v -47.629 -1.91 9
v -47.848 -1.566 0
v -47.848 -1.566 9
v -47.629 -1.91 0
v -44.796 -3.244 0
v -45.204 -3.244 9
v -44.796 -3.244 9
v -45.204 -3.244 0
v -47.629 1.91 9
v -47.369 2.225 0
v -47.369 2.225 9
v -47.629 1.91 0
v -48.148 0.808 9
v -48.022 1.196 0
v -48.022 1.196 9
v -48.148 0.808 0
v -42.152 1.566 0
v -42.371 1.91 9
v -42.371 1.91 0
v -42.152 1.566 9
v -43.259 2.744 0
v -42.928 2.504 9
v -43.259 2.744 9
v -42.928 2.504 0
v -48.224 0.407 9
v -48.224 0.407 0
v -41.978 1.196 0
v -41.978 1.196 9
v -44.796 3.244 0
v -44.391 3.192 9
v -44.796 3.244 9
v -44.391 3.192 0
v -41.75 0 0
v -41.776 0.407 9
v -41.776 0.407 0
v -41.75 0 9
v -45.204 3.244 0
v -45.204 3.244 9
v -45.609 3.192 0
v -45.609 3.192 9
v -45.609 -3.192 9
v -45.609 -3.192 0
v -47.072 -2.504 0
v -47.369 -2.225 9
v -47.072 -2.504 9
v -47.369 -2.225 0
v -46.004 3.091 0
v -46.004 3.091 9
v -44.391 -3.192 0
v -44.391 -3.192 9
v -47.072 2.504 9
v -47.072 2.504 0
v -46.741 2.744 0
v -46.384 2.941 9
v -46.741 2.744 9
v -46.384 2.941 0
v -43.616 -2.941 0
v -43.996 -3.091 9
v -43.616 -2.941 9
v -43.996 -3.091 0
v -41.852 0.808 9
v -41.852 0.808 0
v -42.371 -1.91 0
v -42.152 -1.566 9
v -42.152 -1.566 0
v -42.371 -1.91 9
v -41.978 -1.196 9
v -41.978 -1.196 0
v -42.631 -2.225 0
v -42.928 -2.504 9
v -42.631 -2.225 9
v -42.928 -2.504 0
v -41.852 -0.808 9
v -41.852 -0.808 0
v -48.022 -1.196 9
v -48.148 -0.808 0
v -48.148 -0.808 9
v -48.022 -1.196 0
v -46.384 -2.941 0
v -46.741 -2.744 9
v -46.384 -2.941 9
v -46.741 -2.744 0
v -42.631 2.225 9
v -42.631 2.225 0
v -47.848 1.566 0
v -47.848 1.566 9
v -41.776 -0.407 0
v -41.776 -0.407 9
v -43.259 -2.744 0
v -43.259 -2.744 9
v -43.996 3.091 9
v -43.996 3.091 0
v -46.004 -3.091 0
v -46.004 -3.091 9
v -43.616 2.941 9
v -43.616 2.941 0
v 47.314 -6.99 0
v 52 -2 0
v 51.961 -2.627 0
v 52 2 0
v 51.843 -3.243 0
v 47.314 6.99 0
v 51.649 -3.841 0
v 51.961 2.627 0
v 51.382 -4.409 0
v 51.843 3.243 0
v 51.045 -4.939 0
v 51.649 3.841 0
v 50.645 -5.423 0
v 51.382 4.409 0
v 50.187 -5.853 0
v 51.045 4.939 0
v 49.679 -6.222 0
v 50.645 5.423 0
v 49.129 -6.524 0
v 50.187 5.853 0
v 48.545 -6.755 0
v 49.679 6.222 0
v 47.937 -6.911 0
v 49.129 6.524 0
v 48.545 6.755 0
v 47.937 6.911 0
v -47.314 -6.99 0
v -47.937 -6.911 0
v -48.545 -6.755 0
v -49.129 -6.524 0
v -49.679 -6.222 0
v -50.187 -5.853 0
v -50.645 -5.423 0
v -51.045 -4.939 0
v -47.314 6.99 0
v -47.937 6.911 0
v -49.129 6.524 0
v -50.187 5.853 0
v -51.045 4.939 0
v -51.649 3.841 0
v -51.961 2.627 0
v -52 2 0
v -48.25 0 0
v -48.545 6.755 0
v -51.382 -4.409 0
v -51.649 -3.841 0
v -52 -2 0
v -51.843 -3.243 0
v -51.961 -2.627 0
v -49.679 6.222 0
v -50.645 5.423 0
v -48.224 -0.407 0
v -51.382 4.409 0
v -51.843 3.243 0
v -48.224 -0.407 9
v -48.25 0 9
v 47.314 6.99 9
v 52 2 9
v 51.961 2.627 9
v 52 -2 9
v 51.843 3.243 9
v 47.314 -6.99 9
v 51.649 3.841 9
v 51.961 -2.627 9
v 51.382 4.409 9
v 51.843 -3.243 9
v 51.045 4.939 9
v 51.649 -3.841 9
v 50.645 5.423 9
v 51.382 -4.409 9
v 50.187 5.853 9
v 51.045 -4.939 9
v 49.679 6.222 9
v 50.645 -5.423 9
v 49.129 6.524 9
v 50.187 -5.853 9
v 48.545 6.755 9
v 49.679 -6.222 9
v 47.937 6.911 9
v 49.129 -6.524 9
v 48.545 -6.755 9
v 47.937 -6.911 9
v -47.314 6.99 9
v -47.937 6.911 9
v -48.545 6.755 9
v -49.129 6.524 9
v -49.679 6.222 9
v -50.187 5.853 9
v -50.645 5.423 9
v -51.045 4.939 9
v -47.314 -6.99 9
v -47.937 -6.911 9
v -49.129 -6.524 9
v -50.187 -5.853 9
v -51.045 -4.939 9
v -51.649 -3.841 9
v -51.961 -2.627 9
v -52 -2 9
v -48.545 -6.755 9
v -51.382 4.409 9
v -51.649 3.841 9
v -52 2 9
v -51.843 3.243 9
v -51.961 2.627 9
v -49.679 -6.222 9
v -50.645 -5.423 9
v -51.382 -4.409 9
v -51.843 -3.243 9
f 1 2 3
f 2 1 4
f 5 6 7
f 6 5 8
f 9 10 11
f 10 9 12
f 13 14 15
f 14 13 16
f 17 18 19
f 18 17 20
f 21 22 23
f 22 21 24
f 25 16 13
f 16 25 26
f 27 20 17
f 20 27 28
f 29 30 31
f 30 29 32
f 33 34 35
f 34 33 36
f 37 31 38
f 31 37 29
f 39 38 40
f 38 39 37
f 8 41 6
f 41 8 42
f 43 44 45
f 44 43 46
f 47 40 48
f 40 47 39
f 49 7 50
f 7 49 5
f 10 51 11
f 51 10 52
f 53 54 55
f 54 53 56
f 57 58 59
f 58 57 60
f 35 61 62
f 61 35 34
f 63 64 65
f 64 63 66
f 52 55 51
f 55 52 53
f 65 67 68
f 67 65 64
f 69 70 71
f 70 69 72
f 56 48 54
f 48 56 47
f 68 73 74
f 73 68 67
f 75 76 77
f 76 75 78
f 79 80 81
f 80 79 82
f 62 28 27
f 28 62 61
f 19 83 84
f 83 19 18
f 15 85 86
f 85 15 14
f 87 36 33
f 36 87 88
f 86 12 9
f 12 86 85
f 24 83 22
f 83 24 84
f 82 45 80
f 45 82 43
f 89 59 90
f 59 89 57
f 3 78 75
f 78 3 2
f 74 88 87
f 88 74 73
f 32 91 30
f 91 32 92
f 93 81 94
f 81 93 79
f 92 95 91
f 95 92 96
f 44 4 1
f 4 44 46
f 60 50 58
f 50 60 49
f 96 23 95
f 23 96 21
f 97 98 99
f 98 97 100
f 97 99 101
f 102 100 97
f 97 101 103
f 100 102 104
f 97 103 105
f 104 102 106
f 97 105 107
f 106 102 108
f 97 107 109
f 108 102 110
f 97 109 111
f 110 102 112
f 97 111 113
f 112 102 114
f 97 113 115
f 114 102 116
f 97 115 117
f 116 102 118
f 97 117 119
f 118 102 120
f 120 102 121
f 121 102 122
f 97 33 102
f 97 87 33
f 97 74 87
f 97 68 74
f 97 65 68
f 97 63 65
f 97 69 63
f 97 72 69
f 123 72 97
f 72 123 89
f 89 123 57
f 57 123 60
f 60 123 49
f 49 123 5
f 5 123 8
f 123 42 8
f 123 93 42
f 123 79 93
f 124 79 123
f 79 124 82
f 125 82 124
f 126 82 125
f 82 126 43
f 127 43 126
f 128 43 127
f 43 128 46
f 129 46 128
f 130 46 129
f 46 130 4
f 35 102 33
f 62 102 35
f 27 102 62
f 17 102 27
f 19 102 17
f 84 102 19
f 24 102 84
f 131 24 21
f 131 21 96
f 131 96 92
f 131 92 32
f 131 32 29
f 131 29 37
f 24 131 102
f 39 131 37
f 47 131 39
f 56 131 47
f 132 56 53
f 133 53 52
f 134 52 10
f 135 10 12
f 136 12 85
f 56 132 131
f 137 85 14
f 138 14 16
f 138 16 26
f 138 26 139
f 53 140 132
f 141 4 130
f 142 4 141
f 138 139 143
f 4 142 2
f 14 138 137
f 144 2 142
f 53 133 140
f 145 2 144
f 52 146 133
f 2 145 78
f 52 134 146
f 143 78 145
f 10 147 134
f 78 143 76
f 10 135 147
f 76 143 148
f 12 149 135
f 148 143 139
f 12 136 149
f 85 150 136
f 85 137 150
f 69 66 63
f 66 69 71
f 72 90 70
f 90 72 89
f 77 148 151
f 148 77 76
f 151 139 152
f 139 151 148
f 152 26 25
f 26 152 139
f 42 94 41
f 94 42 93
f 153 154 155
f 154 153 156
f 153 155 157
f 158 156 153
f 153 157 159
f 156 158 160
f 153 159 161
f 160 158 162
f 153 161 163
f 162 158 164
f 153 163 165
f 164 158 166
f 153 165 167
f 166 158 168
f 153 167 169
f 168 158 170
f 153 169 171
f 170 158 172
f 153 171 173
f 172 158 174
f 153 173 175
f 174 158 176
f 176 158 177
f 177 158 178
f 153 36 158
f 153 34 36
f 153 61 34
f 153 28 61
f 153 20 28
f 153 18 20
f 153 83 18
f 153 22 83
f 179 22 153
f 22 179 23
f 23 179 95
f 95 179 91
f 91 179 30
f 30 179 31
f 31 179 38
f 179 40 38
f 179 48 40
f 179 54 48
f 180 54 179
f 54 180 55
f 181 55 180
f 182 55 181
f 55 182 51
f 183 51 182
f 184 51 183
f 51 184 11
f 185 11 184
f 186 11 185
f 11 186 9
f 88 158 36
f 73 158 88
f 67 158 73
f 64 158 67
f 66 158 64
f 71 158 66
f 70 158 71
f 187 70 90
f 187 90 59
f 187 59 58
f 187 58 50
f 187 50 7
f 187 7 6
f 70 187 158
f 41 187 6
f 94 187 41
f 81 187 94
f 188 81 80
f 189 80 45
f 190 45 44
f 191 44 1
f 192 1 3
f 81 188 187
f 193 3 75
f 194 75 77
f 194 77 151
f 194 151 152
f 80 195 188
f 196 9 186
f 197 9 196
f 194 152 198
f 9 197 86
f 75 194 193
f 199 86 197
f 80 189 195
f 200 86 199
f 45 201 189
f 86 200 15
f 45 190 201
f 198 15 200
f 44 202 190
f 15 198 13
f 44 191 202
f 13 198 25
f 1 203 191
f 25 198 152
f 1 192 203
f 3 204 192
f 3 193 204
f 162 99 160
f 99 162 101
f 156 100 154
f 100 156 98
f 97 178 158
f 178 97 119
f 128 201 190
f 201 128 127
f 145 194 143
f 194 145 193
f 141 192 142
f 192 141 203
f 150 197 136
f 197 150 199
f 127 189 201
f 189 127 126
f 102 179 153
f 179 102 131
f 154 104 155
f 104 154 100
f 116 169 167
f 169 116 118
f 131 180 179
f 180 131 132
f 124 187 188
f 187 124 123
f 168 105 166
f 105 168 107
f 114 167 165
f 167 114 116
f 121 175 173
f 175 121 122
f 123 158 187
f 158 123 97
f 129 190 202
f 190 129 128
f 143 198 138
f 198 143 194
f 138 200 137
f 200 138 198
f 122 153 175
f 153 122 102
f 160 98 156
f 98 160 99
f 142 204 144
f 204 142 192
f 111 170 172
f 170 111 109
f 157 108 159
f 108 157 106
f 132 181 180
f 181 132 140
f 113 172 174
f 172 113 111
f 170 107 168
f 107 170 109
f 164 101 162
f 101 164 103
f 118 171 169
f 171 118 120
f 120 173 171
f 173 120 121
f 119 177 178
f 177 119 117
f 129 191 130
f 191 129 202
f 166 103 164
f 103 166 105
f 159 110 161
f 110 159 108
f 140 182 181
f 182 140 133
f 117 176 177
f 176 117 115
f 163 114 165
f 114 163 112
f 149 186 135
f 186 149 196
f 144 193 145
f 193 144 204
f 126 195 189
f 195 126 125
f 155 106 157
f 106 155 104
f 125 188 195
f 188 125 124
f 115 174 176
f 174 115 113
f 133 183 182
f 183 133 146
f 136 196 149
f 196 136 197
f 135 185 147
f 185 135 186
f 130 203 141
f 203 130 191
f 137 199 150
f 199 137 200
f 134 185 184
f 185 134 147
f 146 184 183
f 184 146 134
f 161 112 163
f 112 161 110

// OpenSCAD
$fn = 50;


difference() {
	union() {
		hull() {
			translate(v = [-47.0000000000, 2.0000000000, 0]) {
				cylinder(h = 9, r = 5);
			}
			translate(v = [47.0000000000, 2.0000000000, 0]) {
				cylinder(h = 9, r = 5);
			}
			translate(v = [-47.0000000000, -2.0000000000, 0]) {
				cylinder(h = 9, r = 5);
			}
			translate(v = [47.0000000000, -2.0000000000, 0]) {
				cylinder(h = 9, r = 5);
			}
		}
	}
	union() {
		translate(v = [-45.0000000000, 0.0000000000, 0]) {
			cylinder(h = 9, r = 3.2500000000);
		}
		translate(v = [-45.0000000000, 0.0000000000, 0]) {
			cylinder(h = 9, r = 1.8000000000);
		}
		translate(v = [-45.0000000000, 0.0000000000, 0]) {
			cylinder(h = 9, r = 1.8000000000);
		}
		translate(v = [-45.0000000000, 0.0000000000, 0]) {
			cylinder(h = 9, r = 1.8000000000);
		}
	}
}
